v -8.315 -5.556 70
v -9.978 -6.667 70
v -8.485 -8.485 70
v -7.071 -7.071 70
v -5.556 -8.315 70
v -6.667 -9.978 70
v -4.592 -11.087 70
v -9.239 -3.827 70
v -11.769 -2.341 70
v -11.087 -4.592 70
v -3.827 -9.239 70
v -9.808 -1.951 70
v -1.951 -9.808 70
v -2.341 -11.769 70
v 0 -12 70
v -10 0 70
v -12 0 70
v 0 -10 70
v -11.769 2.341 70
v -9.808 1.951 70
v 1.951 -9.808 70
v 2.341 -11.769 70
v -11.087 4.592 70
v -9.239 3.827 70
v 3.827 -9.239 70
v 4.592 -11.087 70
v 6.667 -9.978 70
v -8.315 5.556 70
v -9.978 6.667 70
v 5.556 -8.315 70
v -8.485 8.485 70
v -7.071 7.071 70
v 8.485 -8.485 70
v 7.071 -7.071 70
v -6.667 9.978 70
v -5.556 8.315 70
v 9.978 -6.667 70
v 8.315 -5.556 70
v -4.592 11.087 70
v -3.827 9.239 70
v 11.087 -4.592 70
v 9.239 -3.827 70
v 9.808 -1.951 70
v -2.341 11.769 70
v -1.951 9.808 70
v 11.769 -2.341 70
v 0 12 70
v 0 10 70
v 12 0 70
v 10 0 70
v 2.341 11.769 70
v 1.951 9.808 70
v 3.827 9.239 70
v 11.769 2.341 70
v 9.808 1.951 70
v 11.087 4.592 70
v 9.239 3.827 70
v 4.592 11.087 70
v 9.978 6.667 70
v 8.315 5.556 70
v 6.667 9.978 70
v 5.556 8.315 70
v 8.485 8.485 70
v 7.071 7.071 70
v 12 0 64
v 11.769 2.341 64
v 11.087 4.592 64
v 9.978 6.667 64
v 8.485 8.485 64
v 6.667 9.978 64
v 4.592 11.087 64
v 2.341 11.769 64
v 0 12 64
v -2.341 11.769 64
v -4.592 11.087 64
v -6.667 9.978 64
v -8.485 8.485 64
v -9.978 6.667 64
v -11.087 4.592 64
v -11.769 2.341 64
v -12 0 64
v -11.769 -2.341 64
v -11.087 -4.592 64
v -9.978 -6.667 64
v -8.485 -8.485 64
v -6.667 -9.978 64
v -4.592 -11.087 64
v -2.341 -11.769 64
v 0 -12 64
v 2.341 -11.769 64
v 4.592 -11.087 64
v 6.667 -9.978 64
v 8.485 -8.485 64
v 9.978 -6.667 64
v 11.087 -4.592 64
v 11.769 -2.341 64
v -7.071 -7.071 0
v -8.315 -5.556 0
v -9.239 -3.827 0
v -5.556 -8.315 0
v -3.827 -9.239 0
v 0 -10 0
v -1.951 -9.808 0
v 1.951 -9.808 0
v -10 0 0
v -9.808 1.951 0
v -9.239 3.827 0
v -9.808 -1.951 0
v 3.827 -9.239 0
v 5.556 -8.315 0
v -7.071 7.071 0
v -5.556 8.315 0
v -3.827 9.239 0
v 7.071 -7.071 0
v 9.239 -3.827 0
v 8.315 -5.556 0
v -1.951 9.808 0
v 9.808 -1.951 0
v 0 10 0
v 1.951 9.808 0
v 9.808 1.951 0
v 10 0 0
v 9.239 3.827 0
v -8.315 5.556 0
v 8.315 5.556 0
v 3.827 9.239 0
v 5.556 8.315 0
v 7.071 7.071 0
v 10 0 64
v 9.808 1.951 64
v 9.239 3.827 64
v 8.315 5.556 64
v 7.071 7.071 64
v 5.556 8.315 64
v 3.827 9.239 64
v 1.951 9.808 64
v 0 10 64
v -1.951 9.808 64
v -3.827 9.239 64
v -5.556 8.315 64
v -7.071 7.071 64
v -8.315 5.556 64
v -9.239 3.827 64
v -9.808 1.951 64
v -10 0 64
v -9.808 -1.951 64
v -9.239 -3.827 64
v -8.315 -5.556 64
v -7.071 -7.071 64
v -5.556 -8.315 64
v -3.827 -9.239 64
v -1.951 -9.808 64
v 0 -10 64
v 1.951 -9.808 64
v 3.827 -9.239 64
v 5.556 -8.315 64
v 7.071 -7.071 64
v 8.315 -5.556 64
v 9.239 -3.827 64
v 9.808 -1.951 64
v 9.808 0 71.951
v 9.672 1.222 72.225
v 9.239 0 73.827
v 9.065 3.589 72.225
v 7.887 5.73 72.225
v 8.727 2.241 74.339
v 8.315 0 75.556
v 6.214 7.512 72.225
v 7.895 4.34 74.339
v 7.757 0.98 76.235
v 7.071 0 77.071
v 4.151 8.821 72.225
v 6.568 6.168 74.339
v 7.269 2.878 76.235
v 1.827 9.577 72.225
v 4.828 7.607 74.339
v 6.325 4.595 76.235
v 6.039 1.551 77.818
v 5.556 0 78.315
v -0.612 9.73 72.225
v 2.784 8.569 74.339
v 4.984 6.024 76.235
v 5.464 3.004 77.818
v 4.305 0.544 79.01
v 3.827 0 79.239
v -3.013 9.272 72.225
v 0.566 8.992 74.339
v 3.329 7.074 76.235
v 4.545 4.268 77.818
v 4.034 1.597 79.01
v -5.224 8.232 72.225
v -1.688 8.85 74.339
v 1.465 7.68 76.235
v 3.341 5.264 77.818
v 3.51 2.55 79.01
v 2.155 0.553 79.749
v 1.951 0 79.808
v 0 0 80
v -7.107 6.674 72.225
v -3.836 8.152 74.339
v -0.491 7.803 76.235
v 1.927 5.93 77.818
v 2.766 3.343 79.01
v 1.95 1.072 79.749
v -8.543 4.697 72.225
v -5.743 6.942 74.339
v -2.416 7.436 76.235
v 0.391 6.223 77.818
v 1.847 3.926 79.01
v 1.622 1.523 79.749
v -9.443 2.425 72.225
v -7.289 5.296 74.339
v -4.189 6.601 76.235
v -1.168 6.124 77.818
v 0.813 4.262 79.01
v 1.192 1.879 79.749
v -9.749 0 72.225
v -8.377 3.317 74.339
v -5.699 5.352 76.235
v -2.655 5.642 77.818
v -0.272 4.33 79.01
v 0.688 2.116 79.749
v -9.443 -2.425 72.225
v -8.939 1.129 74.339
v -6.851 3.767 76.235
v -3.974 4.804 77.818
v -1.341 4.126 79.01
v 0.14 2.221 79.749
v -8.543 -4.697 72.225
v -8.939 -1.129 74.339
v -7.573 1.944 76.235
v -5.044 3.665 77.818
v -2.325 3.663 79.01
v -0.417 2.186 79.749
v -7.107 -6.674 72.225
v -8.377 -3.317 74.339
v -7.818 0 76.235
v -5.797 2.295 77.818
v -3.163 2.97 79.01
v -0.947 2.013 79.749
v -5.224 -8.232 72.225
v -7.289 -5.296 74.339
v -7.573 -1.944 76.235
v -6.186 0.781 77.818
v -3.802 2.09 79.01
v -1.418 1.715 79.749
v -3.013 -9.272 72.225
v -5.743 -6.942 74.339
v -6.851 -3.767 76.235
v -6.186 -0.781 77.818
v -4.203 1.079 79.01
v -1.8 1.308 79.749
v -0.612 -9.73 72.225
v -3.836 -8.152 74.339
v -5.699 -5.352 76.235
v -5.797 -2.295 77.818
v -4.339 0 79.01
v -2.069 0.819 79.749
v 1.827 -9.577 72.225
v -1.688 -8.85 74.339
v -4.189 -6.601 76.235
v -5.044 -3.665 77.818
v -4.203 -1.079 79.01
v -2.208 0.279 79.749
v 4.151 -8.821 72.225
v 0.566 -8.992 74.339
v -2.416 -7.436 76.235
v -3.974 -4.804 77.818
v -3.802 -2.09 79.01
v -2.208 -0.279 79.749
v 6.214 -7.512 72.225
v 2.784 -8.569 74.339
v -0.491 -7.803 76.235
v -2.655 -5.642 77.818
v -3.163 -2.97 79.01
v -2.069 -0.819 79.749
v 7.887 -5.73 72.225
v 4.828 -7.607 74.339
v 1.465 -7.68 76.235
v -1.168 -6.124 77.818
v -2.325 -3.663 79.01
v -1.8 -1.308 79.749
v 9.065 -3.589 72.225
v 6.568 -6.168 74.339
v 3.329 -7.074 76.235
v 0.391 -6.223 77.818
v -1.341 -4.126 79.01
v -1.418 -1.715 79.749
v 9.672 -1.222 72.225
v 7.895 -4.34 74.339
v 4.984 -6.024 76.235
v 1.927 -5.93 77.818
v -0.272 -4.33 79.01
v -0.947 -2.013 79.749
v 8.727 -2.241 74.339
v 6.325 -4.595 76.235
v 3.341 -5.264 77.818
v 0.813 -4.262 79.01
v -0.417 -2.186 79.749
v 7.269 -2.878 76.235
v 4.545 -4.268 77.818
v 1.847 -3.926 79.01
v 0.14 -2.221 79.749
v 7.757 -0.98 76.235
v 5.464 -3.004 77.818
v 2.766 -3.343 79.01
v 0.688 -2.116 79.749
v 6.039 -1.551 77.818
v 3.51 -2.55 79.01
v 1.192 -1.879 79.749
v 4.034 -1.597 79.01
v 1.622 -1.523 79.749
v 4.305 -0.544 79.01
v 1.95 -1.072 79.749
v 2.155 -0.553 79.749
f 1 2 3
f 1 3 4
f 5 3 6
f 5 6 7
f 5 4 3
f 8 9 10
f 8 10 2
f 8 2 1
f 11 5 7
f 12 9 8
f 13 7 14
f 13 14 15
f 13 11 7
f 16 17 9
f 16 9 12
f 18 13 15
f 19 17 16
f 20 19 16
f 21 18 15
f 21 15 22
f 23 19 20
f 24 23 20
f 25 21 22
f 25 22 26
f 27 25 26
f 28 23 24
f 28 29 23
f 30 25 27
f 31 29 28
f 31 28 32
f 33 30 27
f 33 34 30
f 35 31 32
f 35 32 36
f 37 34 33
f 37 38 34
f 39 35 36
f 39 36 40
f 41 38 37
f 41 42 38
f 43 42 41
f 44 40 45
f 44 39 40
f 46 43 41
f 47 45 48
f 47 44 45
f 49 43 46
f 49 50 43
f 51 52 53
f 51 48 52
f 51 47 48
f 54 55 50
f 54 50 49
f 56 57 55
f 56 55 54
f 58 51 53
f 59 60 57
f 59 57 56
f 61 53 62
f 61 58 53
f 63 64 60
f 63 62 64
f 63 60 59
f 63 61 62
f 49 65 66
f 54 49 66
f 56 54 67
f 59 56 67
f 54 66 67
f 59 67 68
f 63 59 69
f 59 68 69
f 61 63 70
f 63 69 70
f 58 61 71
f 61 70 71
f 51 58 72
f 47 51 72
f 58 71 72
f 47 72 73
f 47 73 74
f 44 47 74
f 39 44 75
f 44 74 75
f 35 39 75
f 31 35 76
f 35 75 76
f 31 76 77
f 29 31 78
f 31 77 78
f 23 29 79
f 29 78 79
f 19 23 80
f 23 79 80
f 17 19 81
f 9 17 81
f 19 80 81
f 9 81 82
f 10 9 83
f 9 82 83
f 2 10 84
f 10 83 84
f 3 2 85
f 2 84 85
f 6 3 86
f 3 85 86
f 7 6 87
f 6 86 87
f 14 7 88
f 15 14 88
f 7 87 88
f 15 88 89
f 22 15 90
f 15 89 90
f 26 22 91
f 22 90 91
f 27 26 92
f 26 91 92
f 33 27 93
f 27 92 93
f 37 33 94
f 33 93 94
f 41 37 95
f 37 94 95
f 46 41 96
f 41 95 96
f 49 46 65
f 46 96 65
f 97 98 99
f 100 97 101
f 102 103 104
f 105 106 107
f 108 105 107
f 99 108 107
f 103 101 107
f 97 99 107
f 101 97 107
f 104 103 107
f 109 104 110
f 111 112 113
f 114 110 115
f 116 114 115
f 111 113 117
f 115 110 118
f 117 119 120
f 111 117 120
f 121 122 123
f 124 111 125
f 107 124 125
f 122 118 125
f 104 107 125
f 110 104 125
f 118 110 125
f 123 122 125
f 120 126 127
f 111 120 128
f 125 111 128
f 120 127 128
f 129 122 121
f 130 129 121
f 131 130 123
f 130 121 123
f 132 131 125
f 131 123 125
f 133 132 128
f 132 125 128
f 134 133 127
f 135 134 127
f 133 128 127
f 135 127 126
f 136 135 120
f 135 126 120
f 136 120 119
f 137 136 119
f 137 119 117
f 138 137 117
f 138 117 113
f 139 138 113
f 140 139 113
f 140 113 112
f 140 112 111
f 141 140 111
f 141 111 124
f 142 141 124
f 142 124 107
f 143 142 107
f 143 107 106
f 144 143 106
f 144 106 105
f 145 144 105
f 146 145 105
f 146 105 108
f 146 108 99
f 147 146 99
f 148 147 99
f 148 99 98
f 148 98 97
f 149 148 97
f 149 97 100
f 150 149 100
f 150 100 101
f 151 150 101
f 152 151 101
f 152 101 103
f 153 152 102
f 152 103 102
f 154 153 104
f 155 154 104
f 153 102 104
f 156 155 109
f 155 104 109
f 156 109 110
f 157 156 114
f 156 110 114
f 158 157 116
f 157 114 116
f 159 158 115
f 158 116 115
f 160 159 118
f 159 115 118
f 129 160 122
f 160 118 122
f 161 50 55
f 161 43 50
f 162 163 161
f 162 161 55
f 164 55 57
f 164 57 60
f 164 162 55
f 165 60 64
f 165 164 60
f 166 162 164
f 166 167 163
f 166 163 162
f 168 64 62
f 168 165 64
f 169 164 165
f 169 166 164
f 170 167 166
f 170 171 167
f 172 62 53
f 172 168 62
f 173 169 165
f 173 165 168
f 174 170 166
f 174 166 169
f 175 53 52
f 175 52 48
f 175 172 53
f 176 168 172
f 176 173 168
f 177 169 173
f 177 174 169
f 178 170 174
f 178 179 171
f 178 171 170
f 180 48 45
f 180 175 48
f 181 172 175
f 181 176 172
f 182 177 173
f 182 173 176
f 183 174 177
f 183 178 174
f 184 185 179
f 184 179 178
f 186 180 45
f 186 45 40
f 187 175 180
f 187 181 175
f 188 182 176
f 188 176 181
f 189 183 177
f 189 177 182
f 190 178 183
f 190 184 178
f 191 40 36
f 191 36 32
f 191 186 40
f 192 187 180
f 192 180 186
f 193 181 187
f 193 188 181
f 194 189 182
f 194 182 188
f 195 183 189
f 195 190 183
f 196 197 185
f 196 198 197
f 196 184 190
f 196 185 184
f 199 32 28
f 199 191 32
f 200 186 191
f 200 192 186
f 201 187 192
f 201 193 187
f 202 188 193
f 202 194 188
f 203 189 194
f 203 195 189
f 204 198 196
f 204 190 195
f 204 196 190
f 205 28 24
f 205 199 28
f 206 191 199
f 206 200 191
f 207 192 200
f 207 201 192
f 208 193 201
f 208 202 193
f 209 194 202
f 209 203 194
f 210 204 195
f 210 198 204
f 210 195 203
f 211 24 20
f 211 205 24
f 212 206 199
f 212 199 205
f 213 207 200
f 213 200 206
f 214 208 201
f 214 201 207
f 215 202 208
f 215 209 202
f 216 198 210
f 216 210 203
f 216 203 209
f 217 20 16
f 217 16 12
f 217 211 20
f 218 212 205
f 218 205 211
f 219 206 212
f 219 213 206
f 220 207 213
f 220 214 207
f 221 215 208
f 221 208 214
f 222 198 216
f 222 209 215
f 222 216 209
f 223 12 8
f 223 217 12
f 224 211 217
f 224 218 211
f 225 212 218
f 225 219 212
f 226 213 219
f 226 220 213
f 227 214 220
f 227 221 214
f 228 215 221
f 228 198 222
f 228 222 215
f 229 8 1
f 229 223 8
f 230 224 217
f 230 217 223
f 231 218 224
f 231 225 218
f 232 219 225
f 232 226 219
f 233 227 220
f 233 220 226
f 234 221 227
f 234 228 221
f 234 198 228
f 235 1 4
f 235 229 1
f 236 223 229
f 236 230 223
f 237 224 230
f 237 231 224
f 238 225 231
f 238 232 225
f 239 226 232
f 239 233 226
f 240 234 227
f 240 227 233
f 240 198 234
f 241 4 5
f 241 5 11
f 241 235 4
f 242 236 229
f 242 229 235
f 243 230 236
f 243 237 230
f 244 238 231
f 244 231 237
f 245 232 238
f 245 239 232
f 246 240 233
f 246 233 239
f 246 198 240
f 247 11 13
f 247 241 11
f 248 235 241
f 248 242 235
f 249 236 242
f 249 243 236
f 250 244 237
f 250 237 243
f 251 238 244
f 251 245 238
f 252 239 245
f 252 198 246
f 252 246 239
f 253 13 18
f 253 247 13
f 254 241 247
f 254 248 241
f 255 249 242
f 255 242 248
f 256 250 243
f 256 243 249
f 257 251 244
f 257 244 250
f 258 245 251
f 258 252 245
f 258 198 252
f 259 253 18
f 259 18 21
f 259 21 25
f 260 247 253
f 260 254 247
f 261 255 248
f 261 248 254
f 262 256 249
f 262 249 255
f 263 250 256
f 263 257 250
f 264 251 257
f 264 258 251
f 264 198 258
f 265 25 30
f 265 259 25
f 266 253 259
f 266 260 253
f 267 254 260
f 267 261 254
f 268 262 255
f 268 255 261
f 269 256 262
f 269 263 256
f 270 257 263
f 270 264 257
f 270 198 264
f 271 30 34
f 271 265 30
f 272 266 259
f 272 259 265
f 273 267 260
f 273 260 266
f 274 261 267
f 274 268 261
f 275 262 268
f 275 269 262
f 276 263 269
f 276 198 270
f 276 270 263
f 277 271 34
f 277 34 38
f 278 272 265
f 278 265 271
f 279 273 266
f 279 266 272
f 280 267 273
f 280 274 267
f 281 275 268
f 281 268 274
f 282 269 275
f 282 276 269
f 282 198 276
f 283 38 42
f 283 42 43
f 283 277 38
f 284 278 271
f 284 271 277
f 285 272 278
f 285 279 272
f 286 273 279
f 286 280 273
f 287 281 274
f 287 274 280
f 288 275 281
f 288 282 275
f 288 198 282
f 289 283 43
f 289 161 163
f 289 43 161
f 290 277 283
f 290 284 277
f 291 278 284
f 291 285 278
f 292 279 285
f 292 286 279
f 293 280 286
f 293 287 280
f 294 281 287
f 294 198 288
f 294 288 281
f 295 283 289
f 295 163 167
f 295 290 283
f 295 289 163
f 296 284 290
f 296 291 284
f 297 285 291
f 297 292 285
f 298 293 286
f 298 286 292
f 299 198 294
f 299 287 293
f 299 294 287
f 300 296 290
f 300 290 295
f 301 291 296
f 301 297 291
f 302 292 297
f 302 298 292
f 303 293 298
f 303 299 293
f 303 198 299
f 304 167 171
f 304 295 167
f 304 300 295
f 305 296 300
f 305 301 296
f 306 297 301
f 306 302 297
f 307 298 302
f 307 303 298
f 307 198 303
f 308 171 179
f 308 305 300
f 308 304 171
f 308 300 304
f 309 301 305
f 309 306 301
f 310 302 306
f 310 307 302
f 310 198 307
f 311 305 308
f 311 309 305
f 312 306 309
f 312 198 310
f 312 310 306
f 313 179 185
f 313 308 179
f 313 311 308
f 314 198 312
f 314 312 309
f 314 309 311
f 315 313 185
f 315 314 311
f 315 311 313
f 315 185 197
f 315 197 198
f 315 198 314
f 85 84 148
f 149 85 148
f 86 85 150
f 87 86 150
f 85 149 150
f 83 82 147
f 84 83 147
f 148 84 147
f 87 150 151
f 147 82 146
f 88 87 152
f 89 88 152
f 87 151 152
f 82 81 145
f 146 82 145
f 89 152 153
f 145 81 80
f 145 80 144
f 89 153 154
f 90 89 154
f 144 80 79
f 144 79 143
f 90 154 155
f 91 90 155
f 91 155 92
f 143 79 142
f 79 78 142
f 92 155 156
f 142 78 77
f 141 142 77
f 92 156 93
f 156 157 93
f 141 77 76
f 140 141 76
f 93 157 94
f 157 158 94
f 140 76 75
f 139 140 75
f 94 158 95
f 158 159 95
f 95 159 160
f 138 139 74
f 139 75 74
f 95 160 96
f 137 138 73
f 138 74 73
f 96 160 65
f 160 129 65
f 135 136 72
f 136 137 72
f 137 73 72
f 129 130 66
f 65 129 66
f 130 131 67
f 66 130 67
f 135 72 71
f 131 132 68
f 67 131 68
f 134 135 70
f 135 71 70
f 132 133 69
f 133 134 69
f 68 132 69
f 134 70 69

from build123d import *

# Parameters (mm, degrees)
SKETCH1_R           = 10
BOSS_EXTRUDE1_DEPTH = 80
FILLET1_R           = 10
BOSS_EXTRUDE2_START = 64
SKETCH2_R           = 12
SKETCH2_R_2         = 10
BOSS_EXTRUDE2_DEPTH = 6


with BuildPart() as part:
    # Sketch1 → Boss-Extrude1 (new body)
    with BuildSketch(Plane.XY):
        Circle(SKETCH1_R)
    extrude(amount=BOSS_EXTRUDE1_DEPTH)

    # Fillet1
    fillet1_edges = [part.edges().sort_by_distance(p)[0] for p in [
        (-10, 0, 80),
    ]]
    fillet(fillet1_edges, radius=FILLET1_R)

    # Sketch2 → Boss-Extrude2 (add)
    with BuildSketch(Plane.XY.offset(BOSS_EXTRUDE2_START)):
        Circle(SKETCH2_R)
        Circle(SKETCH2_R_2, mode=Mode.SUBTRACT)
    extrude(amount=BOSS_EXTRUDE2_DEPTH)


solid = part.part
